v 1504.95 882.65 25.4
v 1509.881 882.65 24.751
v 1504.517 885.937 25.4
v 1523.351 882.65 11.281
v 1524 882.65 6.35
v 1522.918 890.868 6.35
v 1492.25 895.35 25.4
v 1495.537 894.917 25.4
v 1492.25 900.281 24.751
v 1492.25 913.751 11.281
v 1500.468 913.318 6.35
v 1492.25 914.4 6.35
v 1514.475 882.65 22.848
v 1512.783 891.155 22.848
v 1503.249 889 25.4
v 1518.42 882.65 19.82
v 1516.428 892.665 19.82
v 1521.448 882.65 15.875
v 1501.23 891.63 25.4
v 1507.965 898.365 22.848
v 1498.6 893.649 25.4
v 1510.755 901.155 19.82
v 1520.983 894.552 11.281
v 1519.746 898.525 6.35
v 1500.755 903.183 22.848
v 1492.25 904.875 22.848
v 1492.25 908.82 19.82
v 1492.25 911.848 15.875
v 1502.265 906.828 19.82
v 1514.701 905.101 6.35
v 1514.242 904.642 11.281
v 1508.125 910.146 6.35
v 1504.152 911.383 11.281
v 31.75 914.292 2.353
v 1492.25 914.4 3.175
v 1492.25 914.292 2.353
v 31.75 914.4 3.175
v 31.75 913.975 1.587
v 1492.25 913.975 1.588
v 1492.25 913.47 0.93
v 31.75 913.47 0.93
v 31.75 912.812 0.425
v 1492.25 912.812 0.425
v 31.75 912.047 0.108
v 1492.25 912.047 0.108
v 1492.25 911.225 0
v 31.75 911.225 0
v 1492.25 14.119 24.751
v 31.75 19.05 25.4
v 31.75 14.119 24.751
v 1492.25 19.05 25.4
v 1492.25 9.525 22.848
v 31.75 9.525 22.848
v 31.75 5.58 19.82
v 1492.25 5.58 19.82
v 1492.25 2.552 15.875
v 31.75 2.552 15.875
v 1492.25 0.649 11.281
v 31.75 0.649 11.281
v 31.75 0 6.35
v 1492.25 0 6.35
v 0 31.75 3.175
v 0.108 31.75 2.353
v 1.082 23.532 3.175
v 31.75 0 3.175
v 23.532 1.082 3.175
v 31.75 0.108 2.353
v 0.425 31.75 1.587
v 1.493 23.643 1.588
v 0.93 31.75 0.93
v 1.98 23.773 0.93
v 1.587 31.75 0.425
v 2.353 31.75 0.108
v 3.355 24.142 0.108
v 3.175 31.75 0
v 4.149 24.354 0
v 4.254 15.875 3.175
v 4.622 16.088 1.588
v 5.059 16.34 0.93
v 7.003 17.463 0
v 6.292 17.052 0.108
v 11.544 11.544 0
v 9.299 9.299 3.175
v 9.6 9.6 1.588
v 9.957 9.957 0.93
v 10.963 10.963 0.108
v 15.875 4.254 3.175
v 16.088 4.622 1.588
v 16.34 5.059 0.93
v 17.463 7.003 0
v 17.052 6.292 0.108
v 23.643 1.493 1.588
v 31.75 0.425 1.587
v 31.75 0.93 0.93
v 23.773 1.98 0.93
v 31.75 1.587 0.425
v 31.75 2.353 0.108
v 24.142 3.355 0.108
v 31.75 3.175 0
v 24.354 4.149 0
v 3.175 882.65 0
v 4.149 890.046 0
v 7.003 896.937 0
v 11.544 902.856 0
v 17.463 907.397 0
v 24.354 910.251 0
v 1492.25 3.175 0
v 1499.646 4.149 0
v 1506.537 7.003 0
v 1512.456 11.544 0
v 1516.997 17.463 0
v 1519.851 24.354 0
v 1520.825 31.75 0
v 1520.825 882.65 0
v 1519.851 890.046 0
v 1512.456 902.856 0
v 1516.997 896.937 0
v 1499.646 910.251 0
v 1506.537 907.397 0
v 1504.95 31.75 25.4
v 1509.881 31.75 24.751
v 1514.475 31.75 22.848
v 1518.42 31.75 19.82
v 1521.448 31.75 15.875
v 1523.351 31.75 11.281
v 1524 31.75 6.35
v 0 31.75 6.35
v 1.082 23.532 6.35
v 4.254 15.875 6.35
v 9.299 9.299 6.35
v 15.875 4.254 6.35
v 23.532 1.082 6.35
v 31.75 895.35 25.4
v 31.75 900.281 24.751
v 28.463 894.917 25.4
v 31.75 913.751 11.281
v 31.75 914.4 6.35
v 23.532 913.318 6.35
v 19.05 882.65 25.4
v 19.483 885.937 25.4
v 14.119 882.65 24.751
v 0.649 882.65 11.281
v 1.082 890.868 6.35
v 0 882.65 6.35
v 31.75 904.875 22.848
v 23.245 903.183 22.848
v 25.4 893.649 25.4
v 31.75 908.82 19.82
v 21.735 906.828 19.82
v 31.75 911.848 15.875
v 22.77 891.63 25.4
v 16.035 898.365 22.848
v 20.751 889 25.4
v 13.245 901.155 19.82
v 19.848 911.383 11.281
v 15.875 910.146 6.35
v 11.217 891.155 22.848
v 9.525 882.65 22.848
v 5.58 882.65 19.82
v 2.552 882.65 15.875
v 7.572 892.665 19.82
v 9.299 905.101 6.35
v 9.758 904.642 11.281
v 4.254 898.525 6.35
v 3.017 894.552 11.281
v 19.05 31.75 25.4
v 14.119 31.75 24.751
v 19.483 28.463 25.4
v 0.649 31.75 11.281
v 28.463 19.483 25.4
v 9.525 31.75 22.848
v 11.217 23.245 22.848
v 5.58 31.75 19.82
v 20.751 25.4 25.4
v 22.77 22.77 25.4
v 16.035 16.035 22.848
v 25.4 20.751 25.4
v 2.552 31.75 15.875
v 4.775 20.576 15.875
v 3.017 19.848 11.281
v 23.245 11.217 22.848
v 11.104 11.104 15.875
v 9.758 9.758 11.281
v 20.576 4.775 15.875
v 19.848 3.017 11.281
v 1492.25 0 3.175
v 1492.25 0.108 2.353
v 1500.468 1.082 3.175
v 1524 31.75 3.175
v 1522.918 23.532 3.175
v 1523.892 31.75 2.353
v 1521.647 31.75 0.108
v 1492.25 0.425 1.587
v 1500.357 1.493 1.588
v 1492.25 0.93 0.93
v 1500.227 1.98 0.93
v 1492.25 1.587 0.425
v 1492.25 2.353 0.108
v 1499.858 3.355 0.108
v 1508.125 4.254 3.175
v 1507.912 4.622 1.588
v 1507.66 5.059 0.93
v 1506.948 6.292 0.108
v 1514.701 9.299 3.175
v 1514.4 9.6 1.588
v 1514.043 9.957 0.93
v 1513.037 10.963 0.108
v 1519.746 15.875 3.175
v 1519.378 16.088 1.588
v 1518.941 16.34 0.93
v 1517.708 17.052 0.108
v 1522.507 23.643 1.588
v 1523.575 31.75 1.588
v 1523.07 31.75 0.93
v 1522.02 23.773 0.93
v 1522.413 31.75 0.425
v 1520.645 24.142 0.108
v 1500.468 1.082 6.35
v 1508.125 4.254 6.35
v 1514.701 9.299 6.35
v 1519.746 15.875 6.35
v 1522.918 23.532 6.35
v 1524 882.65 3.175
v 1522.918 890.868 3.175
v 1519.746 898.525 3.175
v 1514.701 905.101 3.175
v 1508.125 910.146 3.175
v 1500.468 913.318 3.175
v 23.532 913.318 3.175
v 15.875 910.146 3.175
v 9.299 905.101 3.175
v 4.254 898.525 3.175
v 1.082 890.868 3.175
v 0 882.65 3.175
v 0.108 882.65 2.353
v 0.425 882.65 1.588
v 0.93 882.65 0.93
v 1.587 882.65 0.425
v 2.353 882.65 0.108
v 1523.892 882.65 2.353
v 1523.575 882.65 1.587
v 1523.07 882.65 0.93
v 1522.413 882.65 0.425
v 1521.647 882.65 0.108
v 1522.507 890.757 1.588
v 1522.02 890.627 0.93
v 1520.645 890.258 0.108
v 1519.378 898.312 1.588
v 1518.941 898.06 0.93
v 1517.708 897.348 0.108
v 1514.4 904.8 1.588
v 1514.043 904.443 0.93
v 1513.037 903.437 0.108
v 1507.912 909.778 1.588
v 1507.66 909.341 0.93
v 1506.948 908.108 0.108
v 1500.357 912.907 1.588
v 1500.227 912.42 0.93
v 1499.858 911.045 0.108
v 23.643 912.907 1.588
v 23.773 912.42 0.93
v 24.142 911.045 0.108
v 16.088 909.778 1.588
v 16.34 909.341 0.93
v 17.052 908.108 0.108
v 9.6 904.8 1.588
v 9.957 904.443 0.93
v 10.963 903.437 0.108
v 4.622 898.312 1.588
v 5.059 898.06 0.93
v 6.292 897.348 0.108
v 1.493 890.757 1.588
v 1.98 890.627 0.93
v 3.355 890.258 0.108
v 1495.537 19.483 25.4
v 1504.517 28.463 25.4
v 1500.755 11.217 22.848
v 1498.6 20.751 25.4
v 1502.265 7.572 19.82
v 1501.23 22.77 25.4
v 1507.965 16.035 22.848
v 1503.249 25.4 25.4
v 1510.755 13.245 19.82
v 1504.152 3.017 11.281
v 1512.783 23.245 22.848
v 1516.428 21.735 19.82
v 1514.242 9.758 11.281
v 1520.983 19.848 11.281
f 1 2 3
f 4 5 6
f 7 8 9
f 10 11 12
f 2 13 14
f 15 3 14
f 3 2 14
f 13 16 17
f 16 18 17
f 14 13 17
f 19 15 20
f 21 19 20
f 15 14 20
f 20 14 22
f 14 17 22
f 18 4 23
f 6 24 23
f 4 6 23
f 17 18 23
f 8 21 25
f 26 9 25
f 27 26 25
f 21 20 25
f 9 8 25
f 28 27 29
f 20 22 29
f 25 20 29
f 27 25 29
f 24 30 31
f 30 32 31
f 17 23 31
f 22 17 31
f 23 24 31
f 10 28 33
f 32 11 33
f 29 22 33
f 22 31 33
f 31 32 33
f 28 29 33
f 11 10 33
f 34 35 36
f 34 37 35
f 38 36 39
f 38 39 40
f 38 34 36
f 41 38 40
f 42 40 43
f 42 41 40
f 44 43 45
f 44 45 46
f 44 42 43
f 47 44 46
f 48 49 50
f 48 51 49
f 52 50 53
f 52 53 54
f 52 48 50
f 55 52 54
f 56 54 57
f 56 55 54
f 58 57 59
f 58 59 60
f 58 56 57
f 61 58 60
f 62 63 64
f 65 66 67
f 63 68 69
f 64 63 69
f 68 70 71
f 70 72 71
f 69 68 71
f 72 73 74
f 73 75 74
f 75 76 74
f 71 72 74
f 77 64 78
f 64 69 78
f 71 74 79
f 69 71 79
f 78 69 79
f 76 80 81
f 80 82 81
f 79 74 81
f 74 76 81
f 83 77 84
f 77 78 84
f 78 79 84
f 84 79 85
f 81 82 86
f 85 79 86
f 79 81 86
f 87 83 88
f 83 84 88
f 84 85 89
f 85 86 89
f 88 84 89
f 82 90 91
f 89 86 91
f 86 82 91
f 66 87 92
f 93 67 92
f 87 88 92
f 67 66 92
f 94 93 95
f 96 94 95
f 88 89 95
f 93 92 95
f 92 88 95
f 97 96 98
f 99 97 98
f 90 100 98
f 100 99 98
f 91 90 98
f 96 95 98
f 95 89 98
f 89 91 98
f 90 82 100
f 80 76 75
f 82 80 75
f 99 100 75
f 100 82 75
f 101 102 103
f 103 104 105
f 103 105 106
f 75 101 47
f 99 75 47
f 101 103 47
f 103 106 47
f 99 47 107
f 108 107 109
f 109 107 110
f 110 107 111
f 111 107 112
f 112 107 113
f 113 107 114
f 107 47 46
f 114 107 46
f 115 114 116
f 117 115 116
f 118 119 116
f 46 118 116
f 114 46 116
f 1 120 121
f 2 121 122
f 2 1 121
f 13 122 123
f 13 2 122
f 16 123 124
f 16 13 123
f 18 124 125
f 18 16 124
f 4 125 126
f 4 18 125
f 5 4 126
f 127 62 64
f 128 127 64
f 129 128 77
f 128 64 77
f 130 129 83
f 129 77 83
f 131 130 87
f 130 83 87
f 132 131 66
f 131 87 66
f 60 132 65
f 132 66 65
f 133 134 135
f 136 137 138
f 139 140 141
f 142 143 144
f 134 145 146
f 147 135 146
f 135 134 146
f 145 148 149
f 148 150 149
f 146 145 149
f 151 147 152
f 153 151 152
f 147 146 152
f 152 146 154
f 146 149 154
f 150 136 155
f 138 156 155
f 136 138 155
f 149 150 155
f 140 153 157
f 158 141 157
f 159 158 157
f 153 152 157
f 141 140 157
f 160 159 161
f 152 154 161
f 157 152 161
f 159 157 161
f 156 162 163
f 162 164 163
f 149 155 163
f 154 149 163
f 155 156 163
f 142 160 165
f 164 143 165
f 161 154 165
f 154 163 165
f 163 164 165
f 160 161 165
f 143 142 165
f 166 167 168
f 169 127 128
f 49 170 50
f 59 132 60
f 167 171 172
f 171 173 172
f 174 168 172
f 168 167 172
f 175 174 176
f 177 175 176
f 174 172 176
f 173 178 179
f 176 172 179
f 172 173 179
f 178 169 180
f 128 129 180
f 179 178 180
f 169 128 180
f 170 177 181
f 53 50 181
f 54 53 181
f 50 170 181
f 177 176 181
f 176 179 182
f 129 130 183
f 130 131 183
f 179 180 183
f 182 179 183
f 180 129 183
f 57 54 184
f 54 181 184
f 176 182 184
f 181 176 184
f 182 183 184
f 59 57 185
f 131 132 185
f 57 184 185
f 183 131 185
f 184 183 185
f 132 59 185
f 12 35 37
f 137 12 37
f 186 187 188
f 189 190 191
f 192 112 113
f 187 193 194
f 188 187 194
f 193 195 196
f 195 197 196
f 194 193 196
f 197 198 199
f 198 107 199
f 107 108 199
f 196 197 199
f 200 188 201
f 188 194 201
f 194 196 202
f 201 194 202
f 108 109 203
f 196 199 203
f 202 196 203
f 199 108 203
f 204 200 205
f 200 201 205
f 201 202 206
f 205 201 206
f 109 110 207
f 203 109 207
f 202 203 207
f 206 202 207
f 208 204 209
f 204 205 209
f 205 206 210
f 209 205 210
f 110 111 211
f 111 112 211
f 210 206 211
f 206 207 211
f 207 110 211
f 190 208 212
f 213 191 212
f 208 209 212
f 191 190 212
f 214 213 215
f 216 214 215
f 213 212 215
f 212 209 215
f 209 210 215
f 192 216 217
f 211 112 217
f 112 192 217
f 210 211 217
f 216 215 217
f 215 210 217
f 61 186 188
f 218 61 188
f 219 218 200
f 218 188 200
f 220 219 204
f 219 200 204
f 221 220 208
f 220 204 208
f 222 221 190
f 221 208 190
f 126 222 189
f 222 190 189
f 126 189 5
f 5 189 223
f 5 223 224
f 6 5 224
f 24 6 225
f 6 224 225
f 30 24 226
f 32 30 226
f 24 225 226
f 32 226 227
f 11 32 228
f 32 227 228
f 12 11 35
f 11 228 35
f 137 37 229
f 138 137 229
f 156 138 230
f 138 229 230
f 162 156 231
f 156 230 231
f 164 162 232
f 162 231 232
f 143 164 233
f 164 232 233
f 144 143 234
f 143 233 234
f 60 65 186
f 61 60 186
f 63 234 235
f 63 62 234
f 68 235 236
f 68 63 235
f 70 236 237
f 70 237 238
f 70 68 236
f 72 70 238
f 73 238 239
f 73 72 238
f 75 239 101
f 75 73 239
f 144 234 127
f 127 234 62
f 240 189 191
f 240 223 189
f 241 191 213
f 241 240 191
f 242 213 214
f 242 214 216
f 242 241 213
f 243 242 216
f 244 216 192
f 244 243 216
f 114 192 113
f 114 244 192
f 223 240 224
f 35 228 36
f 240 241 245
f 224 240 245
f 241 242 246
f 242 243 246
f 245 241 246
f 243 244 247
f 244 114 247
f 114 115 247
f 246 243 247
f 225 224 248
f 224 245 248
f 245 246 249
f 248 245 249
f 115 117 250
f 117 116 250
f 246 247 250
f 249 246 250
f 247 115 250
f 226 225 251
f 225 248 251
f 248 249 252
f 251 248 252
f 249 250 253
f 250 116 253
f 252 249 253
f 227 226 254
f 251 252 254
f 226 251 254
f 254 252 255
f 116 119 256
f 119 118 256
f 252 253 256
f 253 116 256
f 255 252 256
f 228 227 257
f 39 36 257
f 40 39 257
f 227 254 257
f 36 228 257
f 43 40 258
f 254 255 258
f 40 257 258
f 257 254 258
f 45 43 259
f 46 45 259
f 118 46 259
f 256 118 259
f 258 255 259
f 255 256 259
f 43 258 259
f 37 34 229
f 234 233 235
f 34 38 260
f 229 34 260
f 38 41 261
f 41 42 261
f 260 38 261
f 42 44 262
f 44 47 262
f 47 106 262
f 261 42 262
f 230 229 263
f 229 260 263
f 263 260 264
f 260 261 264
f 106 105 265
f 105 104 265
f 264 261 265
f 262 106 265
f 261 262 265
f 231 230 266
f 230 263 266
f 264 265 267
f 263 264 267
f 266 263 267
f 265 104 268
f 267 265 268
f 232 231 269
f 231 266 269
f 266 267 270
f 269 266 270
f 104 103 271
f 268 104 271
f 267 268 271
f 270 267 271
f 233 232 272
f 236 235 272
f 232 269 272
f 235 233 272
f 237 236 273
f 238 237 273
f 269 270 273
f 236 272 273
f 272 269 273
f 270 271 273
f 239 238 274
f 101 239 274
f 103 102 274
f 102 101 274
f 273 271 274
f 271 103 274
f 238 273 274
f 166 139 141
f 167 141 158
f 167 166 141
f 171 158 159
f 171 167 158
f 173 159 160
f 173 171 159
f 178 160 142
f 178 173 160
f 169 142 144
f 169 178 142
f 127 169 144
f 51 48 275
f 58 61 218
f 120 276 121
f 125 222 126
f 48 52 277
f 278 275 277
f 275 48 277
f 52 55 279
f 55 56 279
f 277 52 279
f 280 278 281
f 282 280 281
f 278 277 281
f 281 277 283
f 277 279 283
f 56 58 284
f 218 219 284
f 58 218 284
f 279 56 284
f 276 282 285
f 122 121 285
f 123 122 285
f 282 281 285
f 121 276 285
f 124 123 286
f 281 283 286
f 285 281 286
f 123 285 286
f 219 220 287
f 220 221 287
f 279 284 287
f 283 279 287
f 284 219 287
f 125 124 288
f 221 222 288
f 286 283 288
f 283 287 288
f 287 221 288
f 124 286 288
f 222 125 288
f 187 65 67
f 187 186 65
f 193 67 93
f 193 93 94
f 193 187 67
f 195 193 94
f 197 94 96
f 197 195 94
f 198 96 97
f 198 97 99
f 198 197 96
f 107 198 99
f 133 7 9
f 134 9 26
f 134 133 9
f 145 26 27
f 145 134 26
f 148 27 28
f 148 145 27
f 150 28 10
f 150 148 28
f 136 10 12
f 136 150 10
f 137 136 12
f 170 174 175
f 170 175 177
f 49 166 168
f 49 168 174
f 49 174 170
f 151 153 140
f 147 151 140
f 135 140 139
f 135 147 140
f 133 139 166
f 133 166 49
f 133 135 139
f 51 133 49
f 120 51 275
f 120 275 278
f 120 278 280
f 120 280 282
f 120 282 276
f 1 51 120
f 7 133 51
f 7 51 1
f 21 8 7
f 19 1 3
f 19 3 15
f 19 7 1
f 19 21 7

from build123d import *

# Parameters (mm, degrees)
F1_DEPTH = 25.4
F2_R     = 3.175
F3_R     = 19.05


with BuildPart() as f1:
    # F0 (on Top) → F1 (new body)
    with BuildSketch(Plane.XY):
        with BuildLine():
            ThreePointArc((0, 31.75), (9.29936, 9.29936), (31.75, 0))
            Line((31.75, 0), (1492.25, 0))
            ThreePointArc((1492.25, 0), (1514.70064, 9.29936), (1524, 31.75))
            Line((1524, 31.75), (1524, 882.65))
            ThreePointArc((1524, 882.65), (1514.70064, 905.10064), (1492.25, 914.4))
            Line((1492.25, 914.4), (31.75, 914.4))
            ThreePointArc((31.75, 914.4), (9.29936, 905.10064), (0, 882.65))
            Line((0, 882.65), (0, 31.75))
        make_face()
    extrude(amount=F1_DEPTH)

    # F2
    f2_edges = [f1.edges().sort_by_distance(p)[0] for p in [
        (762, 0, 0),
    ]]
    fillet(f2_edges, radius=F2_R)

    # F3
    f3_edges = [f1.edges().sort_by_distance(p)[0] for p in [
        (762, 0, 25.4),
    ]]
    fillet(f3_edges, radius=F3_R)


solid = f1.part
